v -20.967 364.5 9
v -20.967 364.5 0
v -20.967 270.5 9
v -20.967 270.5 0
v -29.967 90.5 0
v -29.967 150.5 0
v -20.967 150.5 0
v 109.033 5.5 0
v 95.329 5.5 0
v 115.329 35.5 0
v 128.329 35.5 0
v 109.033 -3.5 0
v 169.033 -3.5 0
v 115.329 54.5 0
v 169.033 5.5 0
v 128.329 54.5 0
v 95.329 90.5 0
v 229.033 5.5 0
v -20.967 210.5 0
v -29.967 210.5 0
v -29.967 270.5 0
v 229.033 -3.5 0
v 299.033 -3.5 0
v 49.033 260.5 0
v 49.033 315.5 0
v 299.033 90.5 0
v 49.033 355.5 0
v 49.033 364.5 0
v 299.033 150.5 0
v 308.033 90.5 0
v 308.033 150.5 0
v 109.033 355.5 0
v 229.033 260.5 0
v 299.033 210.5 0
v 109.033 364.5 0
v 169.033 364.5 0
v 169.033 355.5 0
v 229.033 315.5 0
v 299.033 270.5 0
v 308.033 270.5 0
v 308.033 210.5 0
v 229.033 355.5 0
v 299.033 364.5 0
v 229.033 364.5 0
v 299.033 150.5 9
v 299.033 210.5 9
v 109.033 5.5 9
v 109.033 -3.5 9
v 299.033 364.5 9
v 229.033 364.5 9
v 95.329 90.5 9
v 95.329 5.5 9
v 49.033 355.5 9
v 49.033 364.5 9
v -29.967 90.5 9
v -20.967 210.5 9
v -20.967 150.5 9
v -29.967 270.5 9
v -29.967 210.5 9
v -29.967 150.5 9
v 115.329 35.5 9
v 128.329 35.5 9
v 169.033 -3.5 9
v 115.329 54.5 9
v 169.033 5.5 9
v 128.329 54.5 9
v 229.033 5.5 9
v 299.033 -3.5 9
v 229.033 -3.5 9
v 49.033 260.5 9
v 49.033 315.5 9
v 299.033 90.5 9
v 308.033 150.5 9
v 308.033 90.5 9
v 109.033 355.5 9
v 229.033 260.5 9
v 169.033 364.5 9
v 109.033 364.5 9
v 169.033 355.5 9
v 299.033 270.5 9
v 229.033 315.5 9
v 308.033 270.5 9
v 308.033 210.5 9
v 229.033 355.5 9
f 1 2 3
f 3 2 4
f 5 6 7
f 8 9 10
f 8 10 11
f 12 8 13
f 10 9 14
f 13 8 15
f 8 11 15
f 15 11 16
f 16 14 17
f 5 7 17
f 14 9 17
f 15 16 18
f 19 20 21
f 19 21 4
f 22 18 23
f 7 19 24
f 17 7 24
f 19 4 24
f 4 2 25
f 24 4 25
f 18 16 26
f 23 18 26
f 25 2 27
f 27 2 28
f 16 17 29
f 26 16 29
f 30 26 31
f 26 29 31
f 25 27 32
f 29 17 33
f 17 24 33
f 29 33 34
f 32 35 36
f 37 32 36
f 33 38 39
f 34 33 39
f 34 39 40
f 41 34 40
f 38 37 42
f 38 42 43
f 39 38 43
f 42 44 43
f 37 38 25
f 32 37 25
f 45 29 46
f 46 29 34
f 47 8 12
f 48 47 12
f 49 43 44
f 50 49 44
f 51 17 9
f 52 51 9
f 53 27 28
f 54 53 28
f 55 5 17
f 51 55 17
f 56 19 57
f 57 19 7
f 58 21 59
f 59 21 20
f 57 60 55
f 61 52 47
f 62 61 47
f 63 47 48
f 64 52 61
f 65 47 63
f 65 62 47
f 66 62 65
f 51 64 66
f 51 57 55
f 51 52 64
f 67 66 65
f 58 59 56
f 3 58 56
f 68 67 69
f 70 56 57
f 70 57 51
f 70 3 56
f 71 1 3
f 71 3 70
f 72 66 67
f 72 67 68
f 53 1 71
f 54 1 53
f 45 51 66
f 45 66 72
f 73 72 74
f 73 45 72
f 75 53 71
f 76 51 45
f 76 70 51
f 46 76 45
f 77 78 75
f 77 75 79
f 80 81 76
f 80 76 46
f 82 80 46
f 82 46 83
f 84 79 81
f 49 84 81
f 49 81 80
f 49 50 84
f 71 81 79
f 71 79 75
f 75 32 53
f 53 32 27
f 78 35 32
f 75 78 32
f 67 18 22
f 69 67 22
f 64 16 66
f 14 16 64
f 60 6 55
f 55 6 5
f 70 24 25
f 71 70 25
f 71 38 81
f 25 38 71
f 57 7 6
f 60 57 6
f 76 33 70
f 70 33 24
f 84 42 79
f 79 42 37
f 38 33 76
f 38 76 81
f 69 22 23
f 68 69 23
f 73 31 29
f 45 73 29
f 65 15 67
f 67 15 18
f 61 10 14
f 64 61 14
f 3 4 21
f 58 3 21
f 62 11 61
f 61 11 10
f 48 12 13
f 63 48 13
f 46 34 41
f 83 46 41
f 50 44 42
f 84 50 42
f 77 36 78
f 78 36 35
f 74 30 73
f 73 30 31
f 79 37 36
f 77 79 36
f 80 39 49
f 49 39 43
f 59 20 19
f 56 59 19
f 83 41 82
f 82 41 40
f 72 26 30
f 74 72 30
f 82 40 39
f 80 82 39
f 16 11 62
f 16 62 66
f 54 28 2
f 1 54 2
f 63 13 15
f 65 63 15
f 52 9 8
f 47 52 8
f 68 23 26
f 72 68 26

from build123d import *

# Parameters (mm, degrees)
BOSS_EXTRUDE1_DEPTH = 9
SKETCH2_W           = 74.887018594
SKETCH2_H           = 25.704308128
CUT_EXTRUDE1_DEPTH  = 10
SKETCH3_W           = 13
SKETCH3_H           = 19
CUT_EXTRUDE2_DEPTH  = 10
SKETCH4_W           = 180
SKETCH4_H           = 55
CUT_EXTRUDE3_DEPTH  = 478.310586352


with BuildPart() as part:
    # Sketch1 → Boss-Extrude1 (new body)
    with BuildSketch(Plane.XY):
        Polygon((169.032702555, 364.5), (109.032702555, 364.5), (109.032702555, 355.5), (49.032702555, 355.5), (49.032702555, 364.5), (-20.967297445, 364.5), (-20.967297445, 270.5), (-29.967297445, 270.5), (-29.967297445, 210.5), (-20.967297445, 210.5), (-20.967297445, 150.5), (-29.967297445, 150.5), (-29.967297445, 90.5), (-20.967297445, 90.5), (-20.967297445, -3.5), (49.032702555, -3.5), (49.032702555, 5.5), (109.032702555, 5.5), (109.032702555, -3.5), (169.032702555, -3.5), (169.032702555, 5.5), (229.032702555, 5.5), (229.032702555, -3.5), (299.032702555, -3.5), (299.032702555, 90.5), (308.032702555, 90.5), (308.032702555, 150.5), (299.032702555, 150.5), (299.032702555, 210.5), (308.032702555, 210.5), (308.032702555, 270.5), (299.032702555, 270.5), (299.032702555, 364.5), (229.032702555, 364.5), (229.032702555, 355.5), (169.032702555, 355.5), align=None)
    extrude(amount=BOSS_EXTRUDE1_DEPTH)

    # Sketch2 → Cut-Extrude1 (cut)
    with BuildSketch(Plane(origin=(0, 0, 0), x_dir=(-1, 0, 0), z_dir=(0, 0, -1))):
        Polygon((20.967297445, 90.5), (-95.329165796, 90.5), (-95.329165796, 5.5), (9.317508813, 5.5), (29.967297445, 5.5), (29.967297445, 90.5), align=None)
        with Locations((-14.280157362, -7.352154064)):
            Rectangle(SKETCH2_W, SKETCH2_H)
    extrude(amount=-CUT_EXTRUDE1_DEPTH, mode=Mode.SUBTRACT)

    # Sketch3 → Cut-Extrude2 (cut)
    with BuildSketch(Plane(origin=(0, 0, 0), x_dir=(-1, 0, 0), z_dir=(0, 0, -1))):
        with Locations((-121.829165796, 45)):
            Rectangle(SKETCH3_W, SKETCH3_H)
    extrude(amount=-CUT_EXTRUDE2_DEPTH, mode=Mode.SUBTRACT)

    # Sketch4 → Cut-Extrude3 (cut, through all)
    with BuildSketch(Plane(origin=(0, 0, 0), x_dir=(-1, 0, 0), z_dir=(0, 0, -1))):
        with Locations((-139.032702555, 288)):
            Rectangle(SKETCH4_W, SKETCH4_H)
    extrude(amount=-CUT_EXTRUDE3_DEPTH, mode=Mode.SUBTRACT)


solid = part.part
